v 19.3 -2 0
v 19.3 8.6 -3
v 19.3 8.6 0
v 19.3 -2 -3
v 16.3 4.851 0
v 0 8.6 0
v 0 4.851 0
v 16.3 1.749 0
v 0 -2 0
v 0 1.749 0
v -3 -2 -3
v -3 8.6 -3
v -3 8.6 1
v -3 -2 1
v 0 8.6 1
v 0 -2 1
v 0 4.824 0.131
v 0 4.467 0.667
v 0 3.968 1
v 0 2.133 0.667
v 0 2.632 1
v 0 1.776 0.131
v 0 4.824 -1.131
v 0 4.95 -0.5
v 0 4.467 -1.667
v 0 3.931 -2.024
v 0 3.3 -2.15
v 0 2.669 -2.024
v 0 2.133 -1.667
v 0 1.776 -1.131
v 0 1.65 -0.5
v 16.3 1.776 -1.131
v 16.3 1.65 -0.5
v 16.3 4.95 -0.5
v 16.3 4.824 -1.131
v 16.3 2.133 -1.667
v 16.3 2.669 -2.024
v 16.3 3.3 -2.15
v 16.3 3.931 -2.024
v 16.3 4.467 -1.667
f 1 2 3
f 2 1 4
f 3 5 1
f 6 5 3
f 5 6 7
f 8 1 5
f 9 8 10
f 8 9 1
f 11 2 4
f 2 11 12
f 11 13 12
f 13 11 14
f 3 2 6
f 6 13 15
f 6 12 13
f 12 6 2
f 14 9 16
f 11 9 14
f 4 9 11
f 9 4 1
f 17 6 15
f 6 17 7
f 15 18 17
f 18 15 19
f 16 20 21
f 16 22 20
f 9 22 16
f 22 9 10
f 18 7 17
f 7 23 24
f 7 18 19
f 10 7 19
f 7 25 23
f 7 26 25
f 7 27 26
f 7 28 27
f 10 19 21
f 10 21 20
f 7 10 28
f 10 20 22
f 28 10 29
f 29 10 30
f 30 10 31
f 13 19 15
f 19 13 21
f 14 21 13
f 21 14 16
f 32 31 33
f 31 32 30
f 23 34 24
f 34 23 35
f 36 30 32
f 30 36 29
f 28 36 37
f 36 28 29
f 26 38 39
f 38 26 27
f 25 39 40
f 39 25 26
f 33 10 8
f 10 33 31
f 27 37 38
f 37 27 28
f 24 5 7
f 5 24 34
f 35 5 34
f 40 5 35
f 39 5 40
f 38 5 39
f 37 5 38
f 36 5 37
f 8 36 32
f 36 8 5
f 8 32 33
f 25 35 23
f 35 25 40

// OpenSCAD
use <../utilities.scad>;

l=15.8 + 0.5;
d0=3+0.3;
spline_h=1.2+0.2;

difference(){

	union(){
		translate([-3,-2,-3]) cube([l+6,4+d0*2,3]);
		translate([-3,-2,-1]) cube([3,4+d0*2,2]);
	}

	translate([0,d0,-0.5]) rotate([0,90,0]) cylinder(r=d0/2,h=l,$fn=16);
//	translate([0,d0*3,0]) rotate([0,90,0]) intersection(){
//		cylinder(r=d0/2,h=l,$fn=16);
//		cube([spline_h,d0,9999],center=true);
//	}
//	translate([0,d0*5-spline_h/2,-d0/2]) cube([l,spline_h,d0]);
}
